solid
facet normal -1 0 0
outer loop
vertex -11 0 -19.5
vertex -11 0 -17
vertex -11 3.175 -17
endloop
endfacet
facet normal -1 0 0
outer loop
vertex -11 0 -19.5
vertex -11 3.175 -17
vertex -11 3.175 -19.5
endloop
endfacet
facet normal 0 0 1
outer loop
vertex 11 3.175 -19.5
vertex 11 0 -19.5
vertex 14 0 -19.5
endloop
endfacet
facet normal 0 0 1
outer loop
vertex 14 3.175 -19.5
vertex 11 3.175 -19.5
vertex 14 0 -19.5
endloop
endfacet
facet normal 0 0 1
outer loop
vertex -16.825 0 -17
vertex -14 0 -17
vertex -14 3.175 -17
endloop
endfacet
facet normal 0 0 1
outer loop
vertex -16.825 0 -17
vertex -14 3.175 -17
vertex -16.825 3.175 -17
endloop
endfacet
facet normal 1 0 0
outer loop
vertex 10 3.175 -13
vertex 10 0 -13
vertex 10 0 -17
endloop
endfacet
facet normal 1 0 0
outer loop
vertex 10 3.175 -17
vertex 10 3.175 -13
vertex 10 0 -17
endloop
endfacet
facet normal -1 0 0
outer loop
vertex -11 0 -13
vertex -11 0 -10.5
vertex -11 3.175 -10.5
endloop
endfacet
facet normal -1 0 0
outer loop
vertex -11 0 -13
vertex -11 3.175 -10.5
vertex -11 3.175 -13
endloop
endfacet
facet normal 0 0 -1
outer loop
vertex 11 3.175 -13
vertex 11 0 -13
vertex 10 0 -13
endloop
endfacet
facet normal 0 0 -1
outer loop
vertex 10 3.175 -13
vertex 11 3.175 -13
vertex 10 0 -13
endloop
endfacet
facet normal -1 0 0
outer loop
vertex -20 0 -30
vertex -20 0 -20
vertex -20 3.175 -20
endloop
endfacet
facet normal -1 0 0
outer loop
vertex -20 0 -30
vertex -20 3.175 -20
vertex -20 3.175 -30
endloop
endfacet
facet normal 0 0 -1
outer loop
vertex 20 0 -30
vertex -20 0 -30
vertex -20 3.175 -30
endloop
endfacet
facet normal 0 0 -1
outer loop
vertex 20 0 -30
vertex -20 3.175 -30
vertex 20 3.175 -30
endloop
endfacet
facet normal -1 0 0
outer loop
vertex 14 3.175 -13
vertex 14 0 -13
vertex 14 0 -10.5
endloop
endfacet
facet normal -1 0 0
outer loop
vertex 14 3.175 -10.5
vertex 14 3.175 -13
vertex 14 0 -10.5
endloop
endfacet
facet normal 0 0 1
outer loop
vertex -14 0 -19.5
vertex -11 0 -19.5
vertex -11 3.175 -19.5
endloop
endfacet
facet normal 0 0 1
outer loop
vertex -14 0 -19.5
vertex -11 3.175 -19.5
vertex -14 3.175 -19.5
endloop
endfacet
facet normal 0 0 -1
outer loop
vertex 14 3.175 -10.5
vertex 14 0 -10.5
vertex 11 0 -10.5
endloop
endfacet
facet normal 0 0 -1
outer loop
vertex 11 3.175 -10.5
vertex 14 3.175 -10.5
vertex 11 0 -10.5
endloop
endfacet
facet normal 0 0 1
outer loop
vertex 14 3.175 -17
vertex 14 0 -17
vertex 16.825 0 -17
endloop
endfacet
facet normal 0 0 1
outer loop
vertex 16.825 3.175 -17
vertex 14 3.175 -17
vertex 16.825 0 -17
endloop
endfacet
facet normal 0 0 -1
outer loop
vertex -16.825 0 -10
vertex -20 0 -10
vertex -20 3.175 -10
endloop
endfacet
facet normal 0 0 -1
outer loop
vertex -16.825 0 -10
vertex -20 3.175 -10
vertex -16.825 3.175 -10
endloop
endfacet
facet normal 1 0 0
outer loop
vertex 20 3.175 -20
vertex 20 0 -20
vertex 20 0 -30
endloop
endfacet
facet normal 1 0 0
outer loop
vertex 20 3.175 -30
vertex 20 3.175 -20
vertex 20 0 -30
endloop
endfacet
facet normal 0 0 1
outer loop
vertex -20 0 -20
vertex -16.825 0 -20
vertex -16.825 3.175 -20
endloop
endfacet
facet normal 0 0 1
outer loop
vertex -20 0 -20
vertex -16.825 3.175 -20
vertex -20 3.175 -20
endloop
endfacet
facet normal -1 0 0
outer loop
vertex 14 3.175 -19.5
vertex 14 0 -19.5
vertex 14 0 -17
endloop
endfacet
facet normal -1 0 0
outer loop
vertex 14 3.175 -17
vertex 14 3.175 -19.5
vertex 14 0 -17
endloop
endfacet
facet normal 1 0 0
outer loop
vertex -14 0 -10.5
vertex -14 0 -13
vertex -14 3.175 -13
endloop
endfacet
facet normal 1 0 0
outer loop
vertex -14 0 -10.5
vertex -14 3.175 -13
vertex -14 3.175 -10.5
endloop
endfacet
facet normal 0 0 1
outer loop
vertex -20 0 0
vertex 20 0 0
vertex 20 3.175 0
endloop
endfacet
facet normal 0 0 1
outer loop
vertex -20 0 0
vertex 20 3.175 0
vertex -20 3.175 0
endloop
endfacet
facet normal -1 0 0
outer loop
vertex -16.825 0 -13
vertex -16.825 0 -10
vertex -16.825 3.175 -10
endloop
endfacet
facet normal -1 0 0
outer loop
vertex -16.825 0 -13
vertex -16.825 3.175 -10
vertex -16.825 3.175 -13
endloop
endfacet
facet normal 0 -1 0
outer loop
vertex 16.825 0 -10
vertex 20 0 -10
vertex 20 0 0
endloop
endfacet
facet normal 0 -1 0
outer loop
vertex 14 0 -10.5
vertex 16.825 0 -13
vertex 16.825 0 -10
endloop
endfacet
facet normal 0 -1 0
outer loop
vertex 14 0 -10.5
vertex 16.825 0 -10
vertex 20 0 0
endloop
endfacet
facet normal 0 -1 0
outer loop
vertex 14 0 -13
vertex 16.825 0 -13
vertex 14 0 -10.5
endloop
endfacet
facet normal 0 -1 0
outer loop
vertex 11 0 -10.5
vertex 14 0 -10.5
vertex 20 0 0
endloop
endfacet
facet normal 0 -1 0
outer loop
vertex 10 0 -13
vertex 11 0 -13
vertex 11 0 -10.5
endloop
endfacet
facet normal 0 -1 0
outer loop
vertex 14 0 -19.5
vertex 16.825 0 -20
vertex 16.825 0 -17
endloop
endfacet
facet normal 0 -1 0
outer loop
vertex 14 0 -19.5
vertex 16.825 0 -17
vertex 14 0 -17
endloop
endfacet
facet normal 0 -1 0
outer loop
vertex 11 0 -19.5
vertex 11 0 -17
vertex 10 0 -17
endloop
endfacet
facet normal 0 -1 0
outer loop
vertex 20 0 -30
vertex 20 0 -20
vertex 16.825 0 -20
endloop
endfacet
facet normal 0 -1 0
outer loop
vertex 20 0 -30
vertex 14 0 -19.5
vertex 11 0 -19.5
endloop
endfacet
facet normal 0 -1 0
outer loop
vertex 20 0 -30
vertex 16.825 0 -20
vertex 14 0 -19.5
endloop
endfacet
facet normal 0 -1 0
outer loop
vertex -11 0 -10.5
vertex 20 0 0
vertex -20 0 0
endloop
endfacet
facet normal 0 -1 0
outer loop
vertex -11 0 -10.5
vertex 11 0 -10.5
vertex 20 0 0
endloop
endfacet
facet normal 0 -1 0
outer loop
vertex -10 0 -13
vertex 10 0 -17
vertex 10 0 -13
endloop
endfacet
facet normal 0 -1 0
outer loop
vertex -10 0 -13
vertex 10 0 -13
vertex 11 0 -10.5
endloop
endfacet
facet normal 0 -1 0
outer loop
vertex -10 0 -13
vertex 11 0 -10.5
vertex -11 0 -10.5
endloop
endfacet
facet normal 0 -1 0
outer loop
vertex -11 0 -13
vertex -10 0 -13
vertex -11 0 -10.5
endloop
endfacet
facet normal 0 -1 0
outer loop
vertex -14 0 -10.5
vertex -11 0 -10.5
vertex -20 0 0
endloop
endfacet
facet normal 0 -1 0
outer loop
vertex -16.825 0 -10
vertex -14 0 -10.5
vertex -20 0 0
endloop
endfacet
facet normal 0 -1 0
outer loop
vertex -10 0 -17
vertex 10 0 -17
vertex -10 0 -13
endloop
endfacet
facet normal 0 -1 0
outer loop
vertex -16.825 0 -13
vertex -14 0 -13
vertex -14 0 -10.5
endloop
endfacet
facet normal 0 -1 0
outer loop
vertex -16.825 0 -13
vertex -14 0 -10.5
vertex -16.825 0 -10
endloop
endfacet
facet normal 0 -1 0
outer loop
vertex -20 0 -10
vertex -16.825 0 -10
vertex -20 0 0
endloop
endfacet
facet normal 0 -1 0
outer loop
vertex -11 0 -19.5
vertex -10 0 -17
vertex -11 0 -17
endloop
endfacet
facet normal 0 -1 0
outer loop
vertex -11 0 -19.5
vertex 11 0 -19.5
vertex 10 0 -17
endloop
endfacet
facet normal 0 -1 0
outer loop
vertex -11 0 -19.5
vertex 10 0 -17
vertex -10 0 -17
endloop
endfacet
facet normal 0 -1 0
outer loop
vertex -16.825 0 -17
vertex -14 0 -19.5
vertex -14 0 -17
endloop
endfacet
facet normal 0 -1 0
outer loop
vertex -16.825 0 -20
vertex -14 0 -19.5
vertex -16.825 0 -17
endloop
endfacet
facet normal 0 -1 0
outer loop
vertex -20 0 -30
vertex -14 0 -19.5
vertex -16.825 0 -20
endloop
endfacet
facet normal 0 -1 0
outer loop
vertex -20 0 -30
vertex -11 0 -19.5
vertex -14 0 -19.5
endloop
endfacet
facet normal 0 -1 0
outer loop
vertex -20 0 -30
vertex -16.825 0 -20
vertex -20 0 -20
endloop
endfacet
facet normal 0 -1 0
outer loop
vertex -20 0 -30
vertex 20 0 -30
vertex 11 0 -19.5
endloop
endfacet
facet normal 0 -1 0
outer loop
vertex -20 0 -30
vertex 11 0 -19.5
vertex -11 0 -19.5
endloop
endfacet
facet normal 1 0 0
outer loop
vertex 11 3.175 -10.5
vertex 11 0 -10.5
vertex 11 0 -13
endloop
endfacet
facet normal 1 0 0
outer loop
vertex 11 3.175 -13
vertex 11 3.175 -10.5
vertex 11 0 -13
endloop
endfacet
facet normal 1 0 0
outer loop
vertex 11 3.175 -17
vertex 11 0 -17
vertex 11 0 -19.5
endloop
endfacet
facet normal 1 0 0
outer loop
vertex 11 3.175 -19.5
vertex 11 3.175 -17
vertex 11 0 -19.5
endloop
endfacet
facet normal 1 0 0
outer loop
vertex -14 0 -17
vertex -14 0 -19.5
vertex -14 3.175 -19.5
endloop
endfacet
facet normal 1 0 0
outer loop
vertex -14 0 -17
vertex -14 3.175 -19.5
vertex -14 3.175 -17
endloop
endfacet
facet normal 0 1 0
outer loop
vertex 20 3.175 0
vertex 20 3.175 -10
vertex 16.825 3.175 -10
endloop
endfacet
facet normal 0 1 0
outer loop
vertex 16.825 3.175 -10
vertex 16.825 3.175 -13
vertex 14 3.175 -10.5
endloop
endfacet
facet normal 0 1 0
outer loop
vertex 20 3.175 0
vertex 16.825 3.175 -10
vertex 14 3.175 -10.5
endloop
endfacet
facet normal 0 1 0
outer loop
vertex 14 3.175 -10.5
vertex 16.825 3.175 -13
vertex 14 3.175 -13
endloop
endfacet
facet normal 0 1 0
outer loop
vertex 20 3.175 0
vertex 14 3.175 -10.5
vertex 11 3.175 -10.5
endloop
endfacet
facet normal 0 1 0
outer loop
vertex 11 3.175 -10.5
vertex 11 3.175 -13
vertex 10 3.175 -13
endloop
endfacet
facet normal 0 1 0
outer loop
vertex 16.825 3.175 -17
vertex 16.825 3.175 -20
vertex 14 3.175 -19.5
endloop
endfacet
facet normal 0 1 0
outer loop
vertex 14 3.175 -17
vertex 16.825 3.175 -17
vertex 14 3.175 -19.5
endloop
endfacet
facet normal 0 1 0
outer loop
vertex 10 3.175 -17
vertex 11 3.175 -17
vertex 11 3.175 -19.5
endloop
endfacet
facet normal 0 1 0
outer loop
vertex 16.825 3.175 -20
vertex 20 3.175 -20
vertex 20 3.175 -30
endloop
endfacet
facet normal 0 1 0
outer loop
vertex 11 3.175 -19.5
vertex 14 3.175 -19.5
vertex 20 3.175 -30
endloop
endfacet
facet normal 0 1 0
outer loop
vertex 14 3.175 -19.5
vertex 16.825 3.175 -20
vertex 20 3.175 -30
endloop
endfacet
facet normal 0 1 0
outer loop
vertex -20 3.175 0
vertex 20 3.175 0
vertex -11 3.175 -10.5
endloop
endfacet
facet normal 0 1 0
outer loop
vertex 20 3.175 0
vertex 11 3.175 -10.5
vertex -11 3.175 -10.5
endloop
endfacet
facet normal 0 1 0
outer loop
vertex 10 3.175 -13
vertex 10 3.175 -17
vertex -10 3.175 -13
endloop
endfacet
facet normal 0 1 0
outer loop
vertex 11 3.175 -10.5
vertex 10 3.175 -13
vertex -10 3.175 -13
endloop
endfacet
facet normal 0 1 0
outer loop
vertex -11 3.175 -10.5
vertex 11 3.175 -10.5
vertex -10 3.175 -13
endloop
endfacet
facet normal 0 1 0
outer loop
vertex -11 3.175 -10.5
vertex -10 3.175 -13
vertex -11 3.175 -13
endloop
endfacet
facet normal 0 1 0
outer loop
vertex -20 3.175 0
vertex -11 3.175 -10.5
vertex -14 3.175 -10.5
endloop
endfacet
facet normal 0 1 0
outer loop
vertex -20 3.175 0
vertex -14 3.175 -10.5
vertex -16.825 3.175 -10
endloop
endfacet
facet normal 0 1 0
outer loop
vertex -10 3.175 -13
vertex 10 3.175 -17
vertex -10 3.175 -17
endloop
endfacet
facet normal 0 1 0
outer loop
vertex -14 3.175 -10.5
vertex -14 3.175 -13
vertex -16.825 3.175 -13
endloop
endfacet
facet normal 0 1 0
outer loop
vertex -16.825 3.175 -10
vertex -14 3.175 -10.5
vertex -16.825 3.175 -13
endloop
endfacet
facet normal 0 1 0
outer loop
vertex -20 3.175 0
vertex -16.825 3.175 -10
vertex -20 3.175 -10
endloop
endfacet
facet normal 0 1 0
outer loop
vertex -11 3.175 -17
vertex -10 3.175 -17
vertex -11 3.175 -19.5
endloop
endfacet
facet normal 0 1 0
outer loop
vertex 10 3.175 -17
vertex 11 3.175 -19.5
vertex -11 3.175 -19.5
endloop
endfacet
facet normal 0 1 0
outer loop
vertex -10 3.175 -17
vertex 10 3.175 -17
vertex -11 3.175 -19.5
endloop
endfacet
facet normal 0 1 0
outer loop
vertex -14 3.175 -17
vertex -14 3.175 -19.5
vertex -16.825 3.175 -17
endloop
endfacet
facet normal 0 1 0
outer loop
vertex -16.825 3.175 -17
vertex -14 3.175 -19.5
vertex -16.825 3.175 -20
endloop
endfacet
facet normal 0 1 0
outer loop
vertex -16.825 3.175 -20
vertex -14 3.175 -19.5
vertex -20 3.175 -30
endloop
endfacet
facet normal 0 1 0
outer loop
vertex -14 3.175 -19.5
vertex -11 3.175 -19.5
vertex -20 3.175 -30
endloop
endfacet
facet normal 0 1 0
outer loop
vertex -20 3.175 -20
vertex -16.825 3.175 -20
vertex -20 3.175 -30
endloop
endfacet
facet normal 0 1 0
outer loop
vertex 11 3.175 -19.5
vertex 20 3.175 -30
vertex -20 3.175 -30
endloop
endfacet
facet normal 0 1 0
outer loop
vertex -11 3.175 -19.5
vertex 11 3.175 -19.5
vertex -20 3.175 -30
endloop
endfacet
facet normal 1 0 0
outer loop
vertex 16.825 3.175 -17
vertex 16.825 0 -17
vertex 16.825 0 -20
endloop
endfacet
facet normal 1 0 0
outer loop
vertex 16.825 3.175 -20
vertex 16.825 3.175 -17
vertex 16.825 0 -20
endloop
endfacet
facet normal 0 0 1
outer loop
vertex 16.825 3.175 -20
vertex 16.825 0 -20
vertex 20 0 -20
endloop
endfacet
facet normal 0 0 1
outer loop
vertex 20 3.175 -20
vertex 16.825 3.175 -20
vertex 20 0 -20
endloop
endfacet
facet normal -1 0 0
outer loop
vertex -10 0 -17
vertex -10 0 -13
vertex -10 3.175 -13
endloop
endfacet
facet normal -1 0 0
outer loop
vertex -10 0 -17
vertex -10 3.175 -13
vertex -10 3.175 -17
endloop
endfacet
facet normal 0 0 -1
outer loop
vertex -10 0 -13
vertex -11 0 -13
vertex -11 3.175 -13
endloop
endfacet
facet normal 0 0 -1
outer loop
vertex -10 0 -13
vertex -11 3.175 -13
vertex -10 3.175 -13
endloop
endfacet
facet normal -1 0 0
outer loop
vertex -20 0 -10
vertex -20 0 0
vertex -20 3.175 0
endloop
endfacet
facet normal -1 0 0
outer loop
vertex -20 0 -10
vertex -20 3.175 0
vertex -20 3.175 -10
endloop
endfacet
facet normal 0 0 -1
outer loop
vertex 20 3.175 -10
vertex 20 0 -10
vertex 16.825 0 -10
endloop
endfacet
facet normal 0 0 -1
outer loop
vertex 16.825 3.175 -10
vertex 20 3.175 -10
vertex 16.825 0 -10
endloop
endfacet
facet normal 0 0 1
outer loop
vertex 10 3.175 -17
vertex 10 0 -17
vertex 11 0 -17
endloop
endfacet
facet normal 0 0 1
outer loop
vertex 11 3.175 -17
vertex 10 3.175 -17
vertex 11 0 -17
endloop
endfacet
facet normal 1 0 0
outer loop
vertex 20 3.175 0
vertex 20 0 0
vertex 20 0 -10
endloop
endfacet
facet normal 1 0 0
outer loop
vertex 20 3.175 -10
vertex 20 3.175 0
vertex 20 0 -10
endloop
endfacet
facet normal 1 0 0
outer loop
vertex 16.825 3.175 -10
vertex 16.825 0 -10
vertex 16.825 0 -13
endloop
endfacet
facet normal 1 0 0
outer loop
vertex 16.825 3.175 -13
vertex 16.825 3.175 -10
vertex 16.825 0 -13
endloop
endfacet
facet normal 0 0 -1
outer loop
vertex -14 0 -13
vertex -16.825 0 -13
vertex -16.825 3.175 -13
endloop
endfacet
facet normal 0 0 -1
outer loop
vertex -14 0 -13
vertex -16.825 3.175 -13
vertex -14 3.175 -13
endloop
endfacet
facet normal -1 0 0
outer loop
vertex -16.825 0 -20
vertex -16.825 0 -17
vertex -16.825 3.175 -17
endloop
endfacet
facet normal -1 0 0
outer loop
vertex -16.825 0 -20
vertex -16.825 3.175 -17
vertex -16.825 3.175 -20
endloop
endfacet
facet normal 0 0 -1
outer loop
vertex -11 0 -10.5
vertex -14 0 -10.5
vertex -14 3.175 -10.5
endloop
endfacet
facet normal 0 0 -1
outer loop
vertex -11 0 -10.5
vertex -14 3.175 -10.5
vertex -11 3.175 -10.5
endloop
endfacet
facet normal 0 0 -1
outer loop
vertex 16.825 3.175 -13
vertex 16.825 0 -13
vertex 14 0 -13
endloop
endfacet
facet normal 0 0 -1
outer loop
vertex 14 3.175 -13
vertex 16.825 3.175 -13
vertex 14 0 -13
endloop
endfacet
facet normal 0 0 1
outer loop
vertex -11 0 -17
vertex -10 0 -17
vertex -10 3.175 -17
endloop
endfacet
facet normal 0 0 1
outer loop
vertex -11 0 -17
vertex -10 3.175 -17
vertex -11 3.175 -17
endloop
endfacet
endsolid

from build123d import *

# Parameters (mm, degrees)
BOSS_EXTRUDE1_DEPTH = 3.175


with BuildPart() as part:
    # Sketch2 → Boss-Extrude1 (new body)
    with BuildSketch(Plane(origin=(0, 0, 0), x_dir=(1, 0, 0), z_dir=(0, 1, 0))):
        Polygon((20, 20), (20, 30), (0, 30), (0, 0), (20, 0), (20, 10), (16.825, 10), (16.825, 13), (14, 13), (14, 10.5), (11, 10.5), (11, 13), (10, 13), (10, 17), (11, 17), (11, 19.5), (14, 19.5), (14, 17), (16.825, 17), (16.825, 20), align=None)
    boss_extrude1 = extrude(amount=BOSS_EXTRUDE1_DEPTH)

    # Mirror1: Boss-Extrude1 across plane
    add(boss_extrude1.mirror(Plane(origin=(0, 3.175, 0), x_dir=(0, 0, 1), z_dir=(1, 0, 0))))


solid = part.part
